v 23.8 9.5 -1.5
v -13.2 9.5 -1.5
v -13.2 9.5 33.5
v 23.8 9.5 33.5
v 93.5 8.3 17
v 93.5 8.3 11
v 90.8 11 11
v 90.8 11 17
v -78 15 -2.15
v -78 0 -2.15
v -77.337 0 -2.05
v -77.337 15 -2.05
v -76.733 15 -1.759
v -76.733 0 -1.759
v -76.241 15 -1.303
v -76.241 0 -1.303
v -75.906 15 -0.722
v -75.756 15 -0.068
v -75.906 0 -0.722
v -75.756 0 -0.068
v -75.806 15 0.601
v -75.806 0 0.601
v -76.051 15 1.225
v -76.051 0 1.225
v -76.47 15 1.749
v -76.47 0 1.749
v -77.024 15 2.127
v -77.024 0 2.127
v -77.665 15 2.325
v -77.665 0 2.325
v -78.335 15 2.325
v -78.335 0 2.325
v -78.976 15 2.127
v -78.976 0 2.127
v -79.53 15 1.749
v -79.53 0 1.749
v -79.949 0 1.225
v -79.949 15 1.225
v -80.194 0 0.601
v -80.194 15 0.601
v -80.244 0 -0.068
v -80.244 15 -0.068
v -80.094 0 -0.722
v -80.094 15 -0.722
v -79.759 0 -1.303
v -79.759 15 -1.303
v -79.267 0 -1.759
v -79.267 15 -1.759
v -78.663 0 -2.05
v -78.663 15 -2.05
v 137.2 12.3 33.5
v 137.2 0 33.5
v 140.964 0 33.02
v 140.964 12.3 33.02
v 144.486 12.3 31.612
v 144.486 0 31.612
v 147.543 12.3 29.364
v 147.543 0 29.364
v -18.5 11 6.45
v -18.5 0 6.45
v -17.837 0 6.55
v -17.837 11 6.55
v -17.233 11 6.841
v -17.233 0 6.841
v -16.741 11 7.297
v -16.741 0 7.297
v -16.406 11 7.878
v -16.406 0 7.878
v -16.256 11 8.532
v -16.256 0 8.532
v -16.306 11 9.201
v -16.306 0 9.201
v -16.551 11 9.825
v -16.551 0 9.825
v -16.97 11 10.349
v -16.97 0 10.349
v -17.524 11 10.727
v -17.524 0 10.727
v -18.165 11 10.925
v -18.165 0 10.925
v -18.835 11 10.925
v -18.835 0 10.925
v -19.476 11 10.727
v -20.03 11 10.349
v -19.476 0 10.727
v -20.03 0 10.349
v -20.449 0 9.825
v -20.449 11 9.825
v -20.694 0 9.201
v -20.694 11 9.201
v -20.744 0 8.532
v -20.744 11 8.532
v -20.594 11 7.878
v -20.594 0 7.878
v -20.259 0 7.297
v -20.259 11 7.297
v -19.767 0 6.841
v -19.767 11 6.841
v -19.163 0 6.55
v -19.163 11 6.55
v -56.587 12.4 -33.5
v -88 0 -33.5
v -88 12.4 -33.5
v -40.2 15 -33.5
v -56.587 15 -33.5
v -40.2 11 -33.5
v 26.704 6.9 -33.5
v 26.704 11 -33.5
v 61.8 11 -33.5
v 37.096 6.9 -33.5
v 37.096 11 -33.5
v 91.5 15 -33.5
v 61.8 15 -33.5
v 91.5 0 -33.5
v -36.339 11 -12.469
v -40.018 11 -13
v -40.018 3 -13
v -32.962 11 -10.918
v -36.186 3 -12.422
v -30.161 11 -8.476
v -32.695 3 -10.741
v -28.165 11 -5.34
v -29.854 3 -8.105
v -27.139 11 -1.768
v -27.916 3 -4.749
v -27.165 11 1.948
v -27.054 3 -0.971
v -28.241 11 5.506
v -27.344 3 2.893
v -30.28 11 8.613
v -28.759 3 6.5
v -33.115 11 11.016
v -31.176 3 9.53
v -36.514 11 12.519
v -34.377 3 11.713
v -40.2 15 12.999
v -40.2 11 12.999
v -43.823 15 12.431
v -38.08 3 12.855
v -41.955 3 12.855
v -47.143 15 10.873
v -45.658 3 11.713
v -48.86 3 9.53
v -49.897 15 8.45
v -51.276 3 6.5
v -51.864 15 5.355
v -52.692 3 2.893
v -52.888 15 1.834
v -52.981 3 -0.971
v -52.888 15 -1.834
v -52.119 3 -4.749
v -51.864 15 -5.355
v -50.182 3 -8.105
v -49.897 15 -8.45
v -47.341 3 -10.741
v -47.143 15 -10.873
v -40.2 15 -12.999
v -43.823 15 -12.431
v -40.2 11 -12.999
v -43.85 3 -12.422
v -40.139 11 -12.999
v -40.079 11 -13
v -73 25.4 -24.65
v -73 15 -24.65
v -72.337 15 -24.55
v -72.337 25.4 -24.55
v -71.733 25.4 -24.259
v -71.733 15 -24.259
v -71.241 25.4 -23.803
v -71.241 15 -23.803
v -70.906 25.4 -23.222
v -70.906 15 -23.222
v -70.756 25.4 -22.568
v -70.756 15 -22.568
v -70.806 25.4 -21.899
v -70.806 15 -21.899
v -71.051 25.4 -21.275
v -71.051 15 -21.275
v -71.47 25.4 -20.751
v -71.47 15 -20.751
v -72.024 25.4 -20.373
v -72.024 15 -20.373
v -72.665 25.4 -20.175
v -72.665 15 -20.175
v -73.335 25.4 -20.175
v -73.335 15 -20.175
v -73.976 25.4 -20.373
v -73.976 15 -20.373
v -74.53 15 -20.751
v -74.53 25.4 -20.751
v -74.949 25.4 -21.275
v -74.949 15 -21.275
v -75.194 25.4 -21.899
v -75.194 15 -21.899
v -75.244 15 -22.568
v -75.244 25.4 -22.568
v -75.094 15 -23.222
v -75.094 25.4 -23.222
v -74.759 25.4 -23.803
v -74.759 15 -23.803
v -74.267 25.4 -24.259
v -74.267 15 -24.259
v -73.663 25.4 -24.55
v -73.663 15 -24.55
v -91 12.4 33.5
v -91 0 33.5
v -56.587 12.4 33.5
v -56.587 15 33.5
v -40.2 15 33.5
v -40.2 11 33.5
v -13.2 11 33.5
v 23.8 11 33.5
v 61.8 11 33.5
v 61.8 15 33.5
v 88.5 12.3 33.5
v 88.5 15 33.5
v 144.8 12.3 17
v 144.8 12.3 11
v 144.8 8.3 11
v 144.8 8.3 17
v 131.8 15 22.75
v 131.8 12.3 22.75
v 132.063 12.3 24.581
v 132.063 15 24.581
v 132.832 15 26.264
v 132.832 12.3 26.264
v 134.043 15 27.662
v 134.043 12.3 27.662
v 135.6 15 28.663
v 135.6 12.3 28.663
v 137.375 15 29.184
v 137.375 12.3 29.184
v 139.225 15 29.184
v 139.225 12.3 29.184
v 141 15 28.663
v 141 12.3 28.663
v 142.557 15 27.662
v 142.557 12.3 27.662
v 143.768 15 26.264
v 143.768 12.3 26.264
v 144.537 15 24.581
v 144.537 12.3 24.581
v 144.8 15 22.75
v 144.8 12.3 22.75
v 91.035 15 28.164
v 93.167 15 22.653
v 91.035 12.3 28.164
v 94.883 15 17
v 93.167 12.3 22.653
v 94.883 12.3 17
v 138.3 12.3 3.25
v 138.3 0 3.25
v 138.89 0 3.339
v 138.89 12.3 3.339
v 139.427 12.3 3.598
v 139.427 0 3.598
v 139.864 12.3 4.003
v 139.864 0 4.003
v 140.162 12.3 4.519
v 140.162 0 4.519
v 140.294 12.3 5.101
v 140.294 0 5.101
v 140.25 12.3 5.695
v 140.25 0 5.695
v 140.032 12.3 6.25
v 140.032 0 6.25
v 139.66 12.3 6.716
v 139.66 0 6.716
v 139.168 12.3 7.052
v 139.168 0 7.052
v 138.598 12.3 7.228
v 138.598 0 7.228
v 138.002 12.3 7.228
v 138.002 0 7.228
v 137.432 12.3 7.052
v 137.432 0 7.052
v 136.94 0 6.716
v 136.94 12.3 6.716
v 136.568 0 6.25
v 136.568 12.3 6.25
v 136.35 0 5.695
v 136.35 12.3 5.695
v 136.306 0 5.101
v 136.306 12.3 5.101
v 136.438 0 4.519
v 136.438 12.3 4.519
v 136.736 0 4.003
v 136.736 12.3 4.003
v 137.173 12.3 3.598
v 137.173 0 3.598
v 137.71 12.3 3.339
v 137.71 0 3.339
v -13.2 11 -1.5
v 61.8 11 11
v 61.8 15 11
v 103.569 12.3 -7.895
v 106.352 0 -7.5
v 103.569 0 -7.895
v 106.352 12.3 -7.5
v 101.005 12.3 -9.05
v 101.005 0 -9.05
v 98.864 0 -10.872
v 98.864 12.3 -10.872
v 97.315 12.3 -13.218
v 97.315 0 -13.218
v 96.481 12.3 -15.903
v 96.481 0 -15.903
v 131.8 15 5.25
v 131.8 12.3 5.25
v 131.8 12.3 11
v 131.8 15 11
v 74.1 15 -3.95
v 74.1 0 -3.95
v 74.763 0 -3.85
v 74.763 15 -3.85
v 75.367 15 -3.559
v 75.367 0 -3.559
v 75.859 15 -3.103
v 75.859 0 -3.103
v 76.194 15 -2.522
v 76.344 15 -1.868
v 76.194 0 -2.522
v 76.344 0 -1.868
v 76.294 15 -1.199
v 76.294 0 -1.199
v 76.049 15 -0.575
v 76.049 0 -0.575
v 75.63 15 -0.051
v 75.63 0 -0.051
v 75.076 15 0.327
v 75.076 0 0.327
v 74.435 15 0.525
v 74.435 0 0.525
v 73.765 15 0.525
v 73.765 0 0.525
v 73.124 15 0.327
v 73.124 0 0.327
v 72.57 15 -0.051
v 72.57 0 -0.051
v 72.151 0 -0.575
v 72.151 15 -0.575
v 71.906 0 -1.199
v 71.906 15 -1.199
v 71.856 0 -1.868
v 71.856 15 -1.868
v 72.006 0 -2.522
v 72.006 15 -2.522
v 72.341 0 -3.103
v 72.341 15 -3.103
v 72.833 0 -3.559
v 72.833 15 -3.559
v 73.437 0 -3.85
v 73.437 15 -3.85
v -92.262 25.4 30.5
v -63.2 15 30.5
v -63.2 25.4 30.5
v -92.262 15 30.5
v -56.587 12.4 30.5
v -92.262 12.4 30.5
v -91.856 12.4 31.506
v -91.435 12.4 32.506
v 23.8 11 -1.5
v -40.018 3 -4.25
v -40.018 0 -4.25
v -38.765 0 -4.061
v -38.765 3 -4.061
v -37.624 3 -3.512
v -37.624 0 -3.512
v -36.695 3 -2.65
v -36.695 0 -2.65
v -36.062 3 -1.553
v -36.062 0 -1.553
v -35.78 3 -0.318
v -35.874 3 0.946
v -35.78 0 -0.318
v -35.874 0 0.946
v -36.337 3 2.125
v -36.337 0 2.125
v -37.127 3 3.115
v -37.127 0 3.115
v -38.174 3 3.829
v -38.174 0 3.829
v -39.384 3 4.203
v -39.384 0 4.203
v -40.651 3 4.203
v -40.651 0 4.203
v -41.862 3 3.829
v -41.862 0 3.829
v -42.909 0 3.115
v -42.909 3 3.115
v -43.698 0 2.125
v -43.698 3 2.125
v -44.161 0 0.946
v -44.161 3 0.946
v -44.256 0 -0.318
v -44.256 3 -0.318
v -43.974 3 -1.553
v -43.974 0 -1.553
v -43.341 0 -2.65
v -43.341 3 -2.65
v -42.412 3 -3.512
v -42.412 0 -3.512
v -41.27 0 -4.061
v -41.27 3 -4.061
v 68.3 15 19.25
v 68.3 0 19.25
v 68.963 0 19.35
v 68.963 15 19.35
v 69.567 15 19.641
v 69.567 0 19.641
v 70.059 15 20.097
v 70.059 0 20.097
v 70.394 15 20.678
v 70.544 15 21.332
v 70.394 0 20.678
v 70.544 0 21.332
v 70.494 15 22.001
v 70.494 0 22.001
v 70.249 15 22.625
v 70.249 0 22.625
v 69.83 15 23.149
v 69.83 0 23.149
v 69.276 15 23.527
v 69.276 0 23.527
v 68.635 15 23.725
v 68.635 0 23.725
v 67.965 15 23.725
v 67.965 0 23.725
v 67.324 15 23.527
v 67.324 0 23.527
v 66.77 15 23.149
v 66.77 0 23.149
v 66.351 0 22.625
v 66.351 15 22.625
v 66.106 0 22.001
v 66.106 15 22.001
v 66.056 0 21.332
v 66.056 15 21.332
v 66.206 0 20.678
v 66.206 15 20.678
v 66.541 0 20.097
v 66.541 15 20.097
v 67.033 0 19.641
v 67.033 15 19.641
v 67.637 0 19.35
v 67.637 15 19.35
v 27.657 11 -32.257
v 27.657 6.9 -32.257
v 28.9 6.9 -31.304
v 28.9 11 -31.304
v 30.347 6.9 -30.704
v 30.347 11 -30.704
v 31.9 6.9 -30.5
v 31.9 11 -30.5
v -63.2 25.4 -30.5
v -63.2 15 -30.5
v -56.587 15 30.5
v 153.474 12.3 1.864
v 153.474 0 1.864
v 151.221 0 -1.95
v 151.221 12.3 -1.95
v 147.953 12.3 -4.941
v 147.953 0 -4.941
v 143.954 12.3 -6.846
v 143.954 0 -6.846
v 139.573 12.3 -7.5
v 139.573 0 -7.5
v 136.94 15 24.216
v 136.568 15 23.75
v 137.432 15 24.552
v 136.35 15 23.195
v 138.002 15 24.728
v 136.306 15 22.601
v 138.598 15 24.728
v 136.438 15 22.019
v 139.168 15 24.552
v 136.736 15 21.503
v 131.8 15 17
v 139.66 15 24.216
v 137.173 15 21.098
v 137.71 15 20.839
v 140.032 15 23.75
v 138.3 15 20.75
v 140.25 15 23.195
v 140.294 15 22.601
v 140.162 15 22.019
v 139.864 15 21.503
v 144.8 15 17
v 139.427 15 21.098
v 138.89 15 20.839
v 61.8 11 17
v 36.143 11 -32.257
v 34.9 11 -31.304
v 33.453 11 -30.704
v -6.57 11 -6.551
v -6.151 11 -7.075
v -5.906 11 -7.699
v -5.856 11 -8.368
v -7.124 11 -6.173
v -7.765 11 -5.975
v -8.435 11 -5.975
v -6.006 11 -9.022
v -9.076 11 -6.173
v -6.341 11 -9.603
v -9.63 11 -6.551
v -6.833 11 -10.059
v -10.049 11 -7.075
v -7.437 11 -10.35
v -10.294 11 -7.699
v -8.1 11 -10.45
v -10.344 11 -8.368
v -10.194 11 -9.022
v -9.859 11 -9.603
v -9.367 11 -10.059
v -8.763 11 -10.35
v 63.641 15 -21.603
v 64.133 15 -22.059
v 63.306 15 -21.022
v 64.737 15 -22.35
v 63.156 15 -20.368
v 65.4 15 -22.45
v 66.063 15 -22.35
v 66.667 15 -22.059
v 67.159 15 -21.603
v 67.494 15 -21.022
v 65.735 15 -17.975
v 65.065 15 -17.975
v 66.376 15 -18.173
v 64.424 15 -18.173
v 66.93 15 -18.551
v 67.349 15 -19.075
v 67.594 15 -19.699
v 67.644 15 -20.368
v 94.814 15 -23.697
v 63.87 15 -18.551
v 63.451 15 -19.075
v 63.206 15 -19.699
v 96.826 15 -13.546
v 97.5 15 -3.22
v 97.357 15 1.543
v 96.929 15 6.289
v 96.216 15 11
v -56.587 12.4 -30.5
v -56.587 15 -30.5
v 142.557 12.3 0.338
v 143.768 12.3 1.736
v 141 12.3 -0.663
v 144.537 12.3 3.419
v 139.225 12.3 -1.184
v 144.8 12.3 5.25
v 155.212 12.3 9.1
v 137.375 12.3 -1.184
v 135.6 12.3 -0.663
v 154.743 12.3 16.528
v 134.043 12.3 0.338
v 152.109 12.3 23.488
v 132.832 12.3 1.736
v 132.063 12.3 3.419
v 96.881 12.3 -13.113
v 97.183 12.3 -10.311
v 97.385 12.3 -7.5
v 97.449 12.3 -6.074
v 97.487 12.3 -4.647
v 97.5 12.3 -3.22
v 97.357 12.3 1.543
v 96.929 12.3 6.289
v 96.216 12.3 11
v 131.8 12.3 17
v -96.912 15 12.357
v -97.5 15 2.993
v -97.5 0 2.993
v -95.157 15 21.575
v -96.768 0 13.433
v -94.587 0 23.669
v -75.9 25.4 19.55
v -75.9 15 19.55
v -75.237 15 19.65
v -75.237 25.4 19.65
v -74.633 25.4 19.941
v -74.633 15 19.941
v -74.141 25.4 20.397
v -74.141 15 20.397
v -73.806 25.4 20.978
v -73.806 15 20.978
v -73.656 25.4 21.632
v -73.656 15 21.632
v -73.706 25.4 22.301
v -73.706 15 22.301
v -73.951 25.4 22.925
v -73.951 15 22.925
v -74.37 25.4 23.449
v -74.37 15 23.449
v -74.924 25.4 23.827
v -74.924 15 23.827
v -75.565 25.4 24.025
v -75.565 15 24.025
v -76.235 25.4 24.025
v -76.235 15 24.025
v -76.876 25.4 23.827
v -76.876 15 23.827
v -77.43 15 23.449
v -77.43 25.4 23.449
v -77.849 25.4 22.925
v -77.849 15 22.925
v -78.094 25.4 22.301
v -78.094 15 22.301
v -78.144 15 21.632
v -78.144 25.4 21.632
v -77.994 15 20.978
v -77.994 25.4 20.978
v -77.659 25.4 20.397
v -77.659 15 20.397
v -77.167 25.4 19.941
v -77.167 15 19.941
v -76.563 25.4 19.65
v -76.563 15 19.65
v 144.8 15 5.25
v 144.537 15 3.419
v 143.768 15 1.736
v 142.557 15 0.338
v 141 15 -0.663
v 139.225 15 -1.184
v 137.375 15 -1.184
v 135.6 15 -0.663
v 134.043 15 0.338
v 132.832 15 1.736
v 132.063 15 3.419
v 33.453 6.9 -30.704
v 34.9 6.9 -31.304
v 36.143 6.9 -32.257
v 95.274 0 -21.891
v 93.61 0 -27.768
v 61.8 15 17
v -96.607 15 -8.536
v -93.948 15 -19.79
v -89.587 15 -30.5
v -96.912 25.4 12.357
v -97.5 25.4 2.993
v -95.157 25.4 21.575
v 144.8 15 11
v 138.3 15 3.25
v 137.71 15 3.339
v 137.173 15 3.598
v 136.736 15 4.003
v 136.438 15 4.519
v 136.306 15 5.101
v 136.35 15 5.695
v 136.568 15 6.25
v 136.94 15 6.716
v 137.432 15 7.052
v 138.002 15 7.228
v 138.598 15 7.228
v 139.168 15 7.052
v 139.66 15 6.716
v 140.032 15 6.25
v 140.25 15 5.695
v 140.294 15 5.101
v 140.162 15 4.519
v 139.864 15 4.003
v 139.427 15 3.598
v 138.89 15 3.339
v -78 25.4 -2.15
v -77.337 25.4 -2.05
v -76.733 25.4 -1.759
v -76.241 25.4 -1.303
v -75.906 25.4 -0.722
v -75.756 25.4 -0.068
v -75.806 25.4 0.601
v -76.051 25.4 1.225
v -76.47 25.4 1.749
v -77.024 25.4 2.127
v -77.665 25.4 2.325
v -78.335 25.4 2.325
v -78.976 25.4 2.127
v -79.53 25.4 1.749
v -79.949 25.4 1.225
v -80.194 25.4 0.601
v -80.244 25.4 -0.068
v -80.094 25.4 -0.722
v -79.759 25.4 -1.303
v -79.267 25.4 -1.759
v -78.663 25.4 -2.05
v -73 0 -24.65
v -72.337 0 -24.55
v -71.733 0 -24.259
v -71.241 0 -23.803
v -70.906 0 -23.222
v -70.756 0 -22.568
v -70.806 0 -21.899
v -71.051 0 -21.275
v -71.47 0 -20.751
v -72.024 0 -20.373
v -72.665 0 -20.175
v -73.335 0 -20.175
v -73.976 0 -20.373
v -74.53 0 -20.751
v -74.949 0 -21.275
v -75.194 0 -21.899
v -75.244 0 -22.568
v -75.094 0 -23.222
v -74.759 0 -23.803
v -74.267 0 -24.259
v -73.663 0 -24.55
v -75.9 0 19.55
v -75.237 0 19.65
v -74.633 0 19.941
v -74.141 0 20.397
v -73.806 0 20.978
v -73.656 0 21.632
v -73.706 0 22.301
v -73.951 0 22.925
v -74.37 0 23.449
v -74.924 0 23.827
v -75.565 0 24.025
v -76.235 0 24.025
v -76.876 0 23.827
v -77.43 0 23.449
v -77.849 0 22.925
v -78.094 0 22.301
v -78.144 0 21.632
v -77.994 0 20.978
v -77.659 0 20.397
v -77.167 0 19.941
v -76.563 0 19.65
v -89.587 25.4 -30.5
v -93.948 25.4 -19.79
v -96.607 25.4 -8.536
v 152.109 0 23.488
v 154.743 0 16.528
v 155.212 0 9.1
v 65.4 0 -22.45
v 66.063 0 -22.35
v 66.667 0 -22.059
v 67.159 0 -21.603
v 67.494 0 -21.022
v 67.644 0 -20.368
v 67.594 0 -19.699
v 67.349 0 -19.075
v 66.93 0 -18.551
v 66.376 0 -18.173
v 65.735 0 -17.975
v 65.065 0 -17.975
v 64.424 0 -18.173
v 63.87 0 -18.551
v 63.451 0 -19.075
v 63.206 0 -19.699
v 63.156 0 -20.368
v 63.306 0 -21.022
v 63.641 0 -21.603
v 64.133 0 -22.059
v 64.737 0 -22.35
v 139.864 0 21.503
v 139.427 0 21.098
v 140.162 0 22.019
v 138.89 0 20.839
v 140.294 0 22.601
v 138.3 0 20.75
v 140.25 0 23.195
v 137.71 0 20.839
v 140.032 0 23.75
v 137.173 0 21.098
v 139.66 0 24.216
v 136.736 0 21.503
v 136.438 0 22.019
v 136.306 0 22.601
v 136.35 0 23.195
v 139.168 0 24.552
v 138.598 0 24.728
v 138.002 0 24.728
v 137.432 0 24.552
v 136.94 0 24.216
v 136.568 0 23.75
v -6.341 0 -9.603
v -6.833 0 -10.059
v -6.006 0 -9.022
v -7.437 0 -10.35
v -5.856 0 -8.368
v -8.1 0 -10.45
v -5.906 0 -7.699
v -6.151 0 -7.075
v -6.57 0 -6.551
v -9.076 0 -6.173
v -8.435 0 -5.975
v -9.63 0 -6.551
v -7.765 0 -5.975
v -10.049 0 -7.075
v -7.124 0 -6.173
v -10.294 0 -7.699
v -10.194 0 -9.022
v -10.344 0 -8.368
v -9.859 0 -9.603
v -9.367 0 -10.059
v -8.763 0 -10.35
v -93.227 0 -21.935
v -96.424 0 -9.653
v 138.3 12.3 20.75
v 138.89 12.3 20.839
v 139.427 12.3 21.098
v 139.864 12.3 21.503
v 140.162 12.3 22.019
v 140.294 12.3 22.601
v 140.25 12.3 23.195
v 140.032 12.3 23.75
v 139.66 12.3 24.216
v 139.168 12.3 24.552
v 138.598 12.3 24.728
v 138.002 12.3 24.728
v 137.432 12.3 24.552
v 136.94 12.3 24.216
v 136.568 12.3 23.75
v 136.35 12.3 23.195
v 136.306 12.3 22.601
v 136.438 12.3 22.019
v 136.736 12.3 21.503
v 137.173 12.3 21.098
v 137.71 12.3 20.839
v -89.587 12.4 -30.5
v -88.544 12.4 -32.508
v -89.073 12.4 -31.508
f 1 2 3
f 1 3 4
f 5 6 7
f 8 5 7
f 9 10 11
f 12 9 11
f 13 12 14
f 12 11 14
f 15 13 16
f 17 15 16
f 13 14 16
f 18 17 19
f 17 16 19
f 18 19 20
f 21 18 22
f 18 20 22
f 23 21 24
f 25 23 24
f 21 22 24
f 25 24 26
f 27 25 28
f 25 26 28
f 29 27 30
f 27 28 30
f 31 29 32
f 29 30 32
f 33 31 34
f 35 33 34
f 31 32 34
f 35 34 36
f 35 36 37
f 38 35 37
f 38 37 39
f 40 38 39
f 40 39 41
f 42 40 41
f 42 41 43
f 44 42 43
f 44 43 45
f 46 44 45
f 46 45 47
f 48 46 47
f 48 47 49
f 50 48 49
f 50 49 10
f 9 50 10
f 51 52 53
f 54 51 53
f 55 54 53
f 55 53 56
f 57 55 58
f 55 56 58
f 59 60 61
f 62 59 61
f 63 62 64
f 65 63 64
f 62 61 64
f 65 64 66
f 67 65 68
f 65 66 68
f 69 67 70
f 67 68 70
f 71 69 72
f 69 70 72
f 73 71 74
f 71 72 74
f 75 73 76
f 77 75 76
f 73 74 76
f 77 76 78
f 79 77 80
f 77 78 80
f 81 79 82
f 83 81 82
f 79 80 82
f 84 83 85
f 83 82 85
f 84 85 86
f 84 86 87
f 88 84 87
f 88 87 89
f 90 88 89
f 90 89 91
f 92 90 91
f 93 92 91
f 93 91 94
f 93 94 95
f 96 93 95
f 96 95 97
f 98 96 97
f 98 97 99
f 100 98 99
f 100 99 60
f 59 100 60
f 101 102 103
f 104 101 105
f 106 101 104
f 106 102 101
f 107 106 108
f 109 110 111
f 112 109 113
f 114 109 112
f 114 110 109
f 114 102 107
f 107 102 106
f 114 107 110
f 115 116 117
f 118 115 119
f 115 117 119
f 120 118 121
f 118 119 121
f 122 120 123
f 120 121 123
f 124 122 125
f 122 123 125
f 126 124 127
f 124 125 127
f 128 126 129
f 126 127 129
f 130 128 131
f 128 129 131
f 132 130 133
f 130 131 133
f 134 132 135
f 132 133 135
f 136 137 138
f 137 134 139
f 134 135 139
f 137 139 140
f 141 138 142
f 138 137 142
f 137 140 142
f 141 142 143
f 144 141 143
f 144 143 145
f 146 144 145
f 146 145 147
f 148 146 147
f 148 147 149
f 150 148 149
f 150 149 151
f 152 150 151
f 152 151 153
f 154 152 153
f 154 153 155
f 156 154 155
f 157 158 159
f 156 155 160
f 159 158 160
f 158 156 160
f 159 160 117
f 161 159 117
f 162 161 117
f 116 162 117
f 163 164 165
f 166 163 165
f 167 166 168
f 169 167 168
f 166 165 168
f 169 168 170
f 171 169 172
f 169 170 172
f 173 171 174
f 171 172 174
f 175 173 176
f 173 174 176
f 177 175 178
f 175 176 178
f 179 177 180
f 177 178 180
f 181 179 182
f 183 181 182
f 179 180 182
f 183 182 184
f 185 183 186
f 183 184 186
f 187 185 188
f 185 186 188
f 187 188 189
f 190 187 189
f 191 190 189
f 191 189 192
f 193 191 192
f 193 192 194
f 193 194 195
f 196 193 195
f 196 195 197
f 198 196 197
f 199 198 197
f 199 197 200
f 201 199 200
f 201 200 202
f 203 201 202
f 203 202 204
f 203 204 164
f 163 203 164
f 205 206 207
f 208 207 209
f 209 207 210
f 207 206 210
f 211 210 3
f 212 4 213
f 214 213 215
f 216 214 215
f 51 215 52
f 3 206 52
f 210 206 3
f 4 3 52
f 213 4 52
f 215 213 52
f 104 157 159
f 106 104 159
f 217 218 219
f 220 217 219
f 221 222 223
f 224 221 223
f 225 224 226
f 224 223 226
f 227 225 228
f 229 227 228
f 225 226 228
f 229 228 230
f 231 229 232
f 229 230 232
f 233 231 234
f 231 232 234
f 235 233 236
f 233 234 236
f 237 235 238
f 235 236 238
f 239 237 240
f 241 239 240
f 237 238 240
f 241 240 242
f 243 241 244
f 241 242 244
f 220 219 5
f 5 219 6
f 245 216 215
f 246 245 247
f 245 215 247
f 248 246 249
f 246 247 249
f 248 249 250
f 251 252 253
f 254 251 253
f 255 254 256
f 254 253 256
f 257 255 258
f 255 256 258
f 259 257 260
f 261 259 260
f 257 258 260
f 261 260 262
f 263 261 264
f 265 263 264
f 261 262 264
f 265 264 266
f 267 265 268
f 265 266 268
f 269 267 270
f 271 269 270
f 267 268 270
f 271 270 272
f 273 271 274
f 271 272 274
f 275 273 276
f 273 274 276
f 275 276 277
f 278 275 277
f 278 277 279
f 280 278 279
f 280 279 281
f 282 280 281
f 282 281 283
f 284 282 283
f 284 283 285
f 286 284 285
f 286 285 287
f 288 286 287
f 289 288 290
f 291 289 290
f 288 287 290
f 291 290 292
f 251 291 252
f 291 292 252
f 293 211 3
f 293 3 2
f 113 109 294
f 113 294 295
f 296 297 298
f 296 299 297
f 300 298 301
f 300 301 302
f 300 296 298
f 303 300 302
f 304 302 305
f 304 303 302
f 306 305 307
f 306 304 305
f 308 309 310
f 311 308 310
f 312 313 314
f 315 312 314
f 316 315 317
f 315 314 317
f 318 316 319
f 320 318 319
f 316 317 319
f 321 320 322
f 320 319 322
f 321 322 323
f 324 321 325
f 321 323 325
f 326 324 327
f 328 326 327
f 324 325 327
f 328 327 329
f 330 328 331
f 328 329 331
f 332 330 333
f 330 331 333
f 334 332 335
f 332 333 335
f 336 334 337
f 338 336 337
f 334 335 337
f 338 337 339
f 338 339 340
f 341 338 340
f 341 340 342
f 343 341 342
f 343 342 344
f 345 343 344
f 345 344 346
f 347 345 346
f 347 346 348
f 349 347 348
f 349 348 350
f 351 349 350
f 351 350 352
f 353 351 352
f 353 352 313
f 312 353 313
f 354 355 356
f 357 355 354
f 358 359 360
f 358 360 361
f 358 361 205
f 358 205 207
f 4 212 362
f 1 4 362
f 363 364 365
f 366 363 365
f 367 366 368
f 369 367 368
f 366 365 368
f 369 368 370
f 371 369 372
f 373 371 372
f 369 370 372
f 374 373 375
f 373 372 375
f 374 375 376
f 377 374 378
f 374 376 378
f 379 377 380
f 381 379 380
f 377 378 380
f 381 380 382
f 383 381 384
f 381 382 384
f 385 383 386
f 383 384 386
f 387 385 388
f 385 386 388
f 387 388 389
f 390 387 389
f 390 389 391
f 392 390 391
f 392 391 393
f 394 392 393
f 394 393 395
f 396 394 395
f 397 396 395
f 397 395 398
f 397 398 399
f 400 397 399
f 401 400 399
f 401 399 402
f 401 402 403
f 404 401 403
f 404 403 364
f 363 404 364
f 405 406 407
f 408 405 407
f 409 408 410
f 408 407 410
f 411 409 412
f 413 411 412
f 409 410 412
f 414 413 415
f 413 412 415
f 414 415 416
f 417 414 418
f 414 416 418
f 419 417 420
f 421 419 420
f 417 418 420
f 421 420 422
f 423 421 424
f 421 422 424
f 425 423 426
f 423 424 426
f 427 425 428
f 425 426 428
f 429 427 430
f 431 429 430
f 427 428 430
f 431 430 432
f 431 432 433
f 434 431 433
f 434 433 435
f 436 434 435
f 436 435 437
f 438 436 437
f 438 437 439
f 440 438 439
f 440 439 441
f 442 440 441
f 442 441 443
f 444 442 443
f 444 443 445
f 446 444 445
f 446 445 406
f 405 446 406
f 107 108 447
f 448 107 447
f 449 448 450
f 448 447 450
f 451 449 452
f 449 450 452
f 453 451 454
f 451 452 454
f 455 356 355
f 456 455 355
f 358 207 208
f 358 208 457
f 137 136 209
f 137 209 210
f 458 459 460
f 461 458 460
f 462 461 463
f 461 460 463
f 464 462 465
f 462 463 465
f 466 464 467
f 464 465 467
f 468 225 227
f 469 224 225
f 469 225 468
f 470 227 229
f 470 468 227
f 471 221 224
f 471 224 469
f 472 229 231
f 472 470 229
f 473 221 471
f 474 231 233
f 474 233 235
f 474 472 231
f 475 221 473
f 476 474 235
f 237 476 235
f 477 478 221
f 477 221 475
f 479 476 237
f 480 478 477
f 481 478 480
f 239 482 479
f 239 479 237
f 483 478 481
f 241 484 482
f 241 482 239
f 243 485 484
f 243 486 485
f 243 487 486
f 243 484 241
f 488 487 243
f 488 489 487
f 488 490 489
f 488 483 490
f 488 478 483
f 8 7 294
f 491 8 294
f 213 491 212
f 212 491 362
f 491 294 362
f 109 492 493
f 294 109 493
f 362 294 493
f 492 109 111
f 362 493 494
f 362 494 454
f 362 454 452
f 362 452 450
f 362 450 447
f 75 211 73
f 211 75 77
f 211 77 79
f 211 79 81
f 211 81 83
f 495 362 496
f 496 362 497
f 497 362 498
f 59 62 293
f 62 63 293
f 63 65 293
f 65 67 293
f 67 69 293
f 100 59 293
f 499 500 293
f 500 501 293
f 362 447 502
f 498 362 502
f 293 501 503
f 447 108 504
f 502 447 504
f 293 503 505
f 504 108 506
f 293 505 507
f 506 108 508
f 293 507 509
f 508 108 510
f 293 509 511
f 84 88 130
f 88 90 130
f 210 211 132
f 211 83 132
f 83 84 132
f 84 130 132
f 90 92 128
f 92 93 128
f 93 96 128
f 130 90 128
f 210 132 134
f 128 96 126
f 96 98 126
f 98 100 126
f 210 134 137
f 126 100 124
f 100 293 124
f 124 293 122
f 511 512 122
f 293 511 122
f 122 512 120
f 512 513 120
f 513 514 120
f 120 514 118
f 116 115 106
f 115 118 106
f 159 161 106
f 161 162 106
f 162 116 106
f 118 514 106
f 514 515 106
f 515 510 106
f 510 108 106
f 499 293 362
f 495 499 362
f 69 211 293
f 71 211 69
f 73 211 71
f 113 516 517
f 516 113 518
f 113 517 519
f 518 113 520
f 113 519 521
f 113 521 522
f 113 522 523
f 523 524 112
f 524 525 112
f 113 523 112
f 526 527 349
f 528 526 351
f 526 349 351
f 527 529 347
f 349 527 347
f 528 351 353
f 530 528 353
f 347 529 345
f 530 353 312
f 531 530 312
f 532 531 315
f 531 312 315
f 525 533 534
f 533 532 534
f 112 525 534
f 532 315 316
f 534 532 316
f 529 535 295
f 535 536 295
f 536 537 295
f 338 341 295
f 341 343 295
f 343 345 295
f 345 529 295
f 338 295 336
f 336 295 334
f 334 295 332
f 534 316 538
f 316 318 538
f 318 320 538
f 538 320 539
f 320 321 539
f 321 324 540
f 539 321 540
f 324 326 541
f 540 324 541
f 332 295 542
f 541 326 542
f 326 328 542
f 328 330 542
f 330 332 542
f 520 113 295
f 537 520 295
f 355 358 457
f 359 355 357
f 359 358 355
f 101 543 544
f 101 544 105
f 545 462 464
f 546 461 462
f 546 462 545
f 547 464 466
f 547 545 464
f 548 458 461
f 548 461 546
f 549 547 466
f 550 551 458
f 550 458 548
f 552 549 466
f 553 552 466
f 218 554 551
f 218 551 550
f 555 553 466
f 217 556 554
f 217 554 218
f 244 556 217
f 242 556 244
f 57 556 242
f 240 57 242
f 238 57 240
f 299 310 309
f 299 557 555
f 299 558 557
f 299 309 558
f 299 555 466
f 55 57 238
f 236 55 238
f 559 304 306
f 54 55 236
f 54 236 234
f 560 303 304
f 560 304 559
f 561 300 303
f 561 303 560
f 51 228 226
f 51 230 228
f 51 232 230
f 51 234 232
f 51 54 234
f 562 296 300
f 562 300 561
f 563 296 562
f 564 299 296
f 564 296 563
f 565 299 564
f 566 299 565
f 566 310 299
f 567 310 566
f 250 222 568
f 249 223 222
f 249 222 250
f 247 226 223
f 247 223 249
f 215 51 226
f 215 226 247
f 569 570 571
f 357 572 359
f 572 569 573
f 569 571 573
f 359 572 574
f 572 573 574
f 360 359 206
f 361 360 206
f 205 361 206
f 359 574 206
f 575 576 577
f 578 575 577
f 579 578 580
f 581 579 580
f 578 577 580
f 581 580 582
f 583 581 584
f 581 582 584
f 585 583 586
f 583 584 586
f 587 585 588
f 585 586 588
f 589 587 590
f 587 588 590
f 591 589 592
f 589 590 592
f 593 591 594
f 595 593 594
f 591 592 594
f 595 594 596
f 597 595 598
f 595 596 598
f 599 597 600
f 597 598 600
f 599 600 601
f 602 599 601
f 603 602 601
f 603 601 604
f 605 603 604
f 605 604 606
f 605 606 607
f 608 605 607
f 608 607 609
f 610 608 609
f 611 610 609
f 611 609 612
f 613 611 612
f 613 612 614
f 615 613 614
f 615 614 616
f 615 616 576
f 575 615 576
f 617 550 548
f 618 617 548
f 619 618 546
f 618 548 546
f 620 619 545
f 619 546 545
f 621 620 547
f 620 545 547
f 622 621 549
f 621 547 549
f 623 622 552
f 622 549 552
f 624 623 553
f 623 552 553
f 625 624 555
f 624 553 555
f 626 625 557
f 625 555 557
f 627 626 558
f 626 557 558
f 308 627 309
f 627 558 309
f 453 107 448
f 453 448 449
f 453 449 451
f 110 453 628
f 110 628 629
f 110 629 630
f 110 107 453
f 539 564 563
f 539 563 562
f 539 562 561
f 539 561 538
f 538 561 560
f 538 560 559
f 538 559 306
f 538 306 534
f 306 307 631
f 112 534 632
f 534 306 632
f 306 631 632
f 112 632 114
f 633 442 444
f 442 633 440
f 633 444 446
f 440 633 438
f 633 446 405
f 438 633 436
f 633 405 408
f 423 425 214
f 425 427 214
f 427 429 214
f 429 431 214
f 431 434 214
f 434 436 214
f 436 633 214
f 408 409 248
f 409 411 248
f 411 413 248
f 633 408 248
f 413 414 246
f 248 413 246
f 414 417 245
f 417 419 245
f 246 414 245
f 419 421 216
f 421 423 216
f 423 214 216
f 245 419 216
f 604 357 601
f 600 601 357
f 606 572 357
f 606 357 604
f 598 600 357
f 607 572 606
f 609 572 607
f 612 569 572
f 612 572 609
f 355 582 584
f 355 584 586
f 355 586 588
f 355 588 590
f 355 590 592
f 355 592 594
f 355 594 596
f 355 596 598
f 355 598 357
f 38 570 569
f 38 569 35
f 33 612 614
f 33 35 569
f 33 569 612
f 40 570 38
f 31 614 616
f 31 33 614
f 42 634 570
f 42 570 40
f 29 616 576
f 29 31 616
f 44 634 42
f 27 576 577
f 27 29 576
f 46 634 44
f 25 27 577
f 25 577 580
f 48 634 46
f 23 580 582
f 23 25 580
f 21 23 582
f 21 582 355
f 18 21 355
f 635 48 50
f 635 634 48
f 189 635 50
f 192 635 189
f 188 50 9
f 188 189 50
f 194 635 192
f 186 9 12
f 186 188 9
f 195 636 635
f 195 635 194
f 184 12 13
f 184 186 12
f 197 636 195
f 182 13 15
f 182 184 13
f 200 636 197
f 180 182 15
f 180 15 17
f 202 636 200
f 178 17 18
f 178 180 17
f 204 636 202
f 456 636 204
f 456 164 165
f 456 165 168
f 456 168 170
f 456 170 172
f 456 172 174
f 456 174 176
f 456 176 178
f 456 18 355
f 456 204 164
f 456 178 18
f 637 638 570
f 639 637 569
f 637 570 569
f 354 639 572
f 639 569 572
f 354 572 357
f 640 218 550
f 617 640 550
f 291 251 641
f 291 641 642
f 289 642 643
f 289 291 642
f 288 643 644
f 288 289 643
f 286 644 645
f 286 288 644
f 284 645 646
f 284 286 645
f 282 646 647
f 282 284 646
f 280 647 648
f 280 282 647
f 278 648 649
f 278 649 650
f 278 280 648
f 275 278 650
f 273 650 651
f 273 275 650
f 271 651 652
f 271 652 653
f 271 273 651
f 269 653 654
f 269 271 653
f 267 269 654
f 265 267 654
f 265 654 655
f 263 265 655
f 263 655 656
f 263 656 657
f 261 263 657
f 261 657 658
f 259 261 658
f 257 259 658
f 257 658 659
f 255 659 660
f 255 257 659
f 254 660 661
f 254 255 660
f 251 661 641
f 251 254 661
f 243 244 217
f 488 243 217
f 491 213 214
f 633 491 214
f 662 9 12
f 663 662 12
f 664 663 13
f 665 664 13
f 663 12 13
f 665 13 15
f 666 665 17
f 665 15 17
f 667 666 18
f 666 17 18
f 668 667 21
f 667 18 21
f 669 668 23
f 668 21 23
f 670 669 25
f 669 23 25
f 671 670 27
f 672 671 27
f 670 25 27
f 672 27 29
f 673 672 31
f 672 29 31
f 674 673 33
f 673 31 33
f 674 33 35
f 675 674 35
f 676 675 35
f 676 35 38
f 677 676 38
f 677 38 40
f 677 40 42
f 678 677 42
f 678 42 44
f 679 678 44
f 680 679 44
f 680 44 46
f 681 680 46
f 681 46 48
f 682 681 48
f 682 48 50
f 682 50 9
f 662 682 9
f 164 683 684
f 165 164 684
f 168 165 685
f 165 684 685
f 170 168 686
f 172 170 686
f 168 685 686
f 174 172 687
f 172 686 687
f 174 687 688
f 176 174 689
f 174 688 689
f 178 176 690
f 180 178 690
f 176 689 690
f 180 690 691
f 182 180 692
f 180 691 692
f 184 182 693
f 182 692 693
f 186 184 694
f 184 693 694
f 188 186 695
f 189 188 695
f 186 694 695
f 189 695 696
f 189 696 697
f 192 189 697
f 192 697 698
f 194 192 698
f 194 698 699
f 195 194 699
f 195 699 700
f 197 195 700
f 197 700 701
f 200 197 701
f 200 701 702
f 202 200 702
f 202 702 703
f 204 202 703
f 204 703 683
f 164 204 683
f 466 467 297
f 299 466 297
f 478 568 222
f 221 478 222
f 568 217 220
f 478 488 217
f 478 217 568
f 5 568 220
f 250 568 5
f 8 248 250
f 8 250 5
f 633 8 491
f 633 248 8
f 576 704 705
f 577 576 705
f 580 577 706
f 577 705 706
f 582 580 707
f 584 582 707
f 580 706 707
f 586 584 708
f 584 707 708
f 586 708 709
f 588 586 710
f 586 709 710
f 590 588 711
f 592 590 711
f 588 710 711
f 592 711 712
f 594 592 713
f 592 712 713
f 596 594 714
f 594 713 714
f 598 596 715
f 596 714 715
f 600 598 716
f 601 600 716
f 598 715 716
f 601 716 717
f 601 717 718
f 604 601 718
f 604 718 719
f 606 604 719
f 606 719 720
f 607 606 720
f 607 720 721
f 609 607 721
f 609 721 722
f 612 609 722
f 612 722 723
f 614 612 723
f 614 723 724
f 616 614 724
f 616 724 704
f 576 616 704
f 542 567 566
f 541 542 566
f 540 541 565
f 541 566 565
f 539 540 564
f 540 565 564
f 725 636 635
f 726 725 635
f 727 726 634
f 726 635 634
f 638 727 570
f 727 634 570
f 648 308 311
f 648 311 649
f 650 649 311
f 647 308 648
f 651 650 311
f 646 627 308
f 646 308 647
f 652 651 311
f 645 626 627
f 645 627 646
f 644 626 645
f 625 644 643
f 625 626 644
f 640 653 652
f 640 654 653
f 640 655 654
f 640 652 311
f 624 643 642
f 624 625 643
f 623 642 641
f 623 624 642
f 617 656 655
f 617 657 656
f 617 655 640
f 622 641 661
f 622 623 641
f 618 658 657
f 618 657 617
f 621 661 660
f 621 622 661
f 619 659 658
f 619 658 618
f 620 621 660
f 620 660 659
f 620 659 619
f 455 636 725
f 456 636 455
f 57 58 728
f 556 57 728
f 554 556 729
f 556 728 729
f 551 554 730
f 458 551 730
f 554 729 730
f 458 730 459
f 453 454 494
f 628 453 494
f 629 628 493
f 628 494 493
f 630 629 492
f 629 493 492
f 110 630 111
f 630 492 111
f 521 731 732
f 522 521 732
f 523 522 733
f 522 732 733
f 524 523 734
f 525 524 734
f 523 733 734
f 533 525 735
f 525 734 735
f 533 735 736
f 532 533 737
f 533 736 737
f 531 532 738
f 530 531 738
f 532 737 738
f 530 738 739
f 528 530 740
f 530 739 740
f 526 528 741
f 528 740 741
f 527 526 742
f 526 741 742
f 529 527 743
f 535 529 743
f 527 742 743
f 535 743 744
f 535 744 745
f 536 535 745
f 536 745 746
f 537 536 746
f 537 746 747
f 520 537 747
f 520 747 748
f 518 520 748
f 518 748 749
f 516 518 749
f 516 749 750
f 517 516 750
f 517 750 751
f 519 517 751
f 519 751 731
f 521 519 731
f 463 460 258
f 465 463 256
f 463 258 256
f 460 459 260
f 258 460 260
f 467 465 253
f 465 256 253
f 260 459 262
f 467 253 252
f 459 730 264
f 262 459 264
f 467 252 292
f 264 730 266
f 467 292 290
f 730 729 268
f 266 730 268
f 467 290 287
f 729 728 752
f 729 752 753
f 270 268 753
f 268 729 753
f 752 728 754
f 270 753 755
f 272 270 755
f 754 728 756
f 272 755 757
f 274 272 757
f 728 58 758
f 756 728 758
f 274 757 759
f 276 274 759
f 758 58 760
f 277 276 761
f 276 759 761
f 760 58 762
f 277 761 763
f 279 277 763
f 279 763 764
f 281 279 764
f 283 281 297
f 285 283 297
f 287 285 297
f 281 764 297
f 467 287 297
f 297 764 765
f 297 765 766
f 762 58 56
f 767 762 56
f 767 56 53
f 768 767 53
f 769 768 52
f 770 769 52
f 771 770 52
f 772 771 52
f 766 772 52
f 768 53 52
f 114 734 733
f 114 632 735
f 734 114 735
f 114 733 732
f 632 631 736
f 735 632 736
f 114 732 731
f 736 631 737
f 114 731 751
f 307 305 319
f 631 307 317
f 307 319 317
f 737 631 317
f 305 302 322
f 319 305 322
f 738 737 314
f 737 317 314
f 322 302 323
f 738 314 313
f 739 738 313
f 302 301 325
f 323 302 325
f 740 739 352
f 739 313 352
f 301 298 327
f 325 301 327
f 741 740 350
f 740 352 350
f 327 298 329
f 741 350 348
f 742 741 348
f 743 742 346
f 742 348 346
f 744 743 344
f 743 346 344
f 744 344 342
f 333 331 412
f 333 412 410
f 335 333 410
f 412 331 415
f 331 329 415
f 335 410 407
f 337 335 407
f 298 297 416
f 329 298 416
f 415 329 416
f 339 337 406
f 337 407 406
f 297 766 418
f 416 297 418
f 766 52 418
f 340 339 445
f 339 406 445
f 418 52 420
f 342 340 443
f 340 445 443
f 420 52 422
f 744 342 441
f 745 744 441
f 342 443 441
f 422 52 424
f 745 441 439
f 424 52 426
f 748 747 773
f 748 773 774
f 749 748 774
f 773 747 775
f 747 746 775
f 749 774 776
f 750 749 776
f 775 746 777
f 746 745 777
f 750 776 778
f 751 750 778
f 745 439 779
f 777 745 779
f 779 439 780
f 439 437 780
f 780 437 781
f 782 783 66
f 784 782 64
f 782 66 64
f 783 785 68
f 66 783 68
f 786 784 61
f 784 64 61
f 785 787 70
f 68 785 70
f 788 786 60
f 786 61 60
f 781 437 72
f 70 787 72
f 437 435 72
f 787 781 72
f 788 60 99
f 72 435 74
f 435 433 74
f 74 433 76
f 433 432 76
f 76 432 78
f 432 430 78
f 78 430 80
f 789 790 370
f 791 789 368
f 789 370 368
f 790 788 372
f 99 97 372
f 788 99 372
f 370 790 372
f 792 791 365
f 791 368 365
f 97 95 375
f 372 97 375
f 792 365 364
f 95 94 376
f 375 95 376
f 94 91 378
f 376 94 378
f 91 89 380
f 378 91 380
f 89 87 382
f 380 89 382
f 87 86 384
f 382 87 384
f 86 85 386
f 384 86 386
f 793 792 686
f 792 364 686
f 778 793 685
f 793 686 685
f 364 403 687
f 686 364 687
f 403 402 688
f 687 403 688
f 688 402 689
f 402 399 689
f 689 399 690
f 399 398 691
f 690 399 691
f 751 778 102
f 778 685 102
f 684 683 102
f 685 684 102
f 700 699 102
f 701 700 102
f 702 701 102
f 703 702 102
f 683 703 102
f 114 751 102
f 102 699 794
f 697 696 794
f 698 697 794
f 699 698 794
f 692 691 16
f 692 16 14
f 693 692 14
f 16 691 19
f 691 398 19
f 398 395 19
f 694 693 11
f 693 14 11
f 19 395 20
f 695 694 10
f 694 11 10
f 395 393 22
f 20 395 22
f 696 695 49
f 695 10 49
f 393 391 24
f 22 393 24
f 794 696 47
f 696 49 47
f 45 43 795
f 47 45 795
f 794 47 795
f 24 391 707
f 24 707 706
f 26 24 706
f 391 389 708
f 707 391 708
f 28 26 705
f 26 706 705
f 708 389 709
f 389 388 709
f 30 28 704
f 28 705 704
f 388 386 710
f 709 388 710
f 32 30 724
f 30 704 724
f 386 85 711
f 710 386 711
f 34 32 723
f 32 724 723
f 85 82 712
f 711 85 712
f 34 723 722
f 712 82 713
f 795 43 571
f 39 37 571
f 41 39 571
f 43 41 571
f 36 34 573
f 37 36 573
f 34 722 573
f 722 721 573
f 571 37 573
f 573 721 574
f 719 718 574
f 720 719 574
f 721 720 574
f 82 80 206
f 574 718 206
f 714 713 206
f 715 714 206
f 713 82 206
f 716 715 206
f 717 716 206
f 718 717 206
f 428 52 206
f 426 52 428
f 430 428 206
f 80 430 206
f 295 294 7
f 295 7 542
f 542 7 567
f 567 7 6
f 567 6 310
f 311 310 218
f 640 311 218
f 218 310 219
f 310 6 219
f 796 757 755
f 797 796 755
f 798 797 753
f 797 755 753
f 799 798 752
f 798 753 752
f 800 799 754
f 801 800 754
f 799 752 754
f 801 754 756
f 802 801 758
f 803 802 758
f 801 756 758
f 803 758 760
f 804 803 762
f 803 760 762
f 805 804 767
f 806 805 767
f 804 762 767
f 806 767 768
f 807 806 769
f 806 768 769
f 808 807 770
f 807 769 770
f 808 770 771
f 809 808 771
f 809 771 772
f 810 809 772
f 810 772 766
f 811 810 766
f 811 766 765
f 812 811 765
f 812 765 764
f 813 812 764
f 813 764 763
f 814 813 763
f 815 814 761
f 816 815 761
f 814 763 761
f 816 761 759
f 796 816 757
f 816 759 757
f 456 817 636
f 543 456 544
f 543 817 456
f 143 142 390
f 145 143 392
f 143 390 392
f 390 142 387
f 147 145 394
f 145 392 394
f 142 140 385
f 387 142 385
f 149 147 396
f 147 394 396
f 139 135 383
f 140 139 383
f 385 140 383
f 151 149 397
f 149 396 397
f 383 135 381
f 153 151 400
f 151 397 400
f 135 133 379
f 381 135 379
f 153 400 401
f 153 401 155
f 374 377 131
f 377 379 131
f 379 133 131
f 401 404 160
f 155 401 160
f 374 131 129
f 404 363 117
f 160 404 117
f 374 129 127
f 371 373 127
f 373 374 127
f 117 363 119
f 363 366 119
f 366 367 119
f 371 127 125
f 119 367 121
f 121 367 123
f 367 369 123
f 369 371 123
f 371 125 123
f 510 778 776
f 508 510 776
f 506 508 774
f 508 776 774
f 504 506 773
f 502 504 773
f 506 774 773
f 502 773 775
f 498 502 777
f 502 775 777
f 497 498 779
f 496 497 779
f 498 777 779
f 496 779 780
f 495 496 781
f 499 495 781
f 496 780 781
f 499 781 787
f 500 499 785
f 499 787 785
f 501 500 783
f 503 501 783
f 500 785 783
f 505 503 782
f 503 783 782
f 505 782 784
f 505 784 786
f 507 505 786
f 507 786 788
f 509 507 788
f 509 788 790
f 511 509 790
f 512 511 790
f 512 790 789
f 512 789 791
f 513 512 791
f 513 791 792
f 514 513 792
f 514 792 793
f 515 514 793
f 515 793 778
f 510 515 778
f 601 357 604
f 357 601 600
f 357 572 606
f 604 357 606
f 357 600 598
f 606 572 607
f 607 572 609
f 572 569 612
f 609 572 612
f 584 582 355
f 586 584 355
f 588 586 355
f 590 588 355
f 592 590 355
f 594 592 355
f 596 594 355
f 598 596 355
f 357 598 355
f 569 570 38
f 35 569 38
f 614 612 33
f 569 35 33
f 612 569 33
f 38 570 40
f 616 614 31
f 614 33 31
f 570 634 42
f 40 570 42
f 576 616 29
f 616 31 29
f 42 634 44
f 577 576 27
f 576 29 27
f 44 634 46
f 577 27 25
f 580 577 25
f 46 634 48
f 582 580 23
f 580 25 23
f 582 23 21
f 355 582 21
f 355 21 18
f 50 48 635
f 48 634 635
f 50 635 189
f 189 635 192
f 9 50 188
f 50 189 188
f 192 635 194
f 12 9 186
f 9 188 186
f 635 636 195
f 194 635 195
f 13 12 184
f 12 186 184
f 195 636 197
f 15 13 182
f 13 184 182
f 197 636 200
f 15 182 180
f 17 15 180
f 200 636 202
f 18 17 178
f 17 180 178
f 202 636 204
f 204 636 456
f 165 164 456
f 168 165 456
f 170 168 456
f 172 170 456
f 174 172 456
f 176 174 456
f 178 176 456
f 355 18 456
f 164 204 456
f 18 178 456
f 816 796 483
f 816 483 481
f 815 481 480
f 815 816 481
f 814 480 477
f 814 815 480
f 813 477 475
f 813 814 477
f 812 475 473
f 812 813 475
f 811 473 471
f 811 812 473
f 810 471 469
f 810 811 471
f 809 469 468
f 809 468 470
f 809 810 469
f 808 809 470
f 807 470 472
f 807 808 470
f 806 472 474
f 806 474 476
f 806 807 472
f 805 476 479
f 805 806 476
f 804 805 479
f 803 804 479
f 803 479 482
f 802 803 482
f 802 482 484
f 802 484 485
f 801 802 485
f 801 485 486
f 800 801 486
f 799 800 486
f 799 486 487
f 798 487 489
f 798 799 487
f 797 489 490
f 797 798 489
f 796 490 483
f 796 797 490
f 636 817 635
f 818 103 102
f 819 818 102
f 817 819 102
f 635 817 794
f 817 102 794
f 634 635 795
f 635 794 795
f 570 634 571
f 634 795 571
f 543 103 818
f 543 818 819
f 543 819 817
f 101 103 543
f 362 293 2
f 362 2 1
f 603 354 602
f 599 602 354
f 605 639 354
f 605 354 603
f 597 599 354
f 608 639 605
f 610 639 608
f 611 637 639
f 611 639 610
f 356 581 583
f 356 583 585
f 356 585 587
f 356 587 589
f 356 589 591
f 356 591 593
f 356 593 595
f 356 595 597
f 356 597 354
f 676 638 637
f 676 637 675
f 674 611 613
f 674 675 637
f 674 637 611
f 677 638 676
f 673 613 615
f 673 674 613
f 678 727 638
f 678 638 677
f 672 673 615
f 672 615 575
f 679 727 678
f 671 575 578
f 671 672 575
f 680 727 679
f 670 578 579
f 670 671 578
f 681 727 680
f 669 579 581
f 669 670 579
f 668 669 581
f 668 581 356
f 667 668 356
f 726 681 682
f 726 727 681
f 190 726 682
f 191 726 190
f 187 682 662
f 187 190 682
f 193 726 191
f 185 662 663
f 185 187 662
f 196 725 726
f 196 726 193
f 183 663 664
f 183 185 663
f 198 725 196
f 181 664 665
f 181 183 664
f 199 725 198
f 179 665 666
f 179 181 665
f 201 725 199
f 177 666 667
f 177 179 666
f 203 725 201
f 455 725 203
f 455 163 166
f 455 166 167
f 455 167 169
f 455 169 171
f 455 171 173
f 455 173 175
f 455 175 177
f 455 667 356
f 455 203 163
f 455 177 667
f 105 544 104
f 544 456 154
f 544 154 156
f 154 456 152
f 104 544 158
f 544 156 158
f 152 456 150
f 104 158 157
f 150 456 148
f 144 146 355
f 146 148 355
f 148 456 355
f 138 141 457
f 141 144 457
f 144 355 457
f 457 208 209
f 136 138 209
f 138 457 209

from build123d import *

# Parameters (mm, degrees)
SKETCH1_W           = 195
SKETCH1_H           = 67
BOSS_EXTRUDE1_DEPTH = 25.4
CUT_EXTRUDE1_DEPTH  = 107.177492907
CUT_EXTRUDE2_DEPTH  = 121.997561959
CUT_EXTRUDE3_START  = -13
SKETCH4_W           = 6.612655346
SKETCH4_H           = 3
CUT_EXTRUDE3_DEPTH  = 13
SKETCH6_R           = 2.25
CUT_EXTRUDE4_DEPTH  = 107.177492907
SKETCH7_W           = 37
SKETCH7_H           = 35
CUT_EXTRUDE5_DEPTH  = 1.5
CUT_EXTRUDE6_DEPTH  = 18.5
SKETCH9_R           = 2
BOSS_EXTRUDE2_DEPTH = 12.3
FILLET1_R           = 10
CUT_EXTRUDE7_REACH  = 165.895
CUT_EXTRUDE7_START  = -3
SKETCH10_R          = 13
SKETCH13_R          = 4.25
CUT_EXTRUDE9_DEPTH  = 161.89488962
SKETCH11_R          = 2
BOSS_EXTRUDE3_DEPTH = 2.7
CUT_EXTRUDE8_DEPTH  = 6


# Read off the part's stored shape, not the designer's step: Split1
with BuildPart() as part:
    # Sketch1 → Boss-Extrude1 (new body)
    with BuildSketch(Plane(origin=(0, 0, 0), x_dir=(1, 0, 0), z_dir=(0, 1, 0))):
        Rectangle(SKETCH1_W, SKETCH1_H)
    extrude(amount=BOSS_EXTRUDE1_DEPTH)

    # Sketch2 → Cut-Extrude1 (cut, through all)
    with BuildSketch(Plane.XZ):
        with BuildLine():
            Line((97.5, -3.219751644), (97.5, 33.5))
            Line((97.5, 33.5), (88.5, 33.5))
            ThreePointArc((88.5, 33.5), (95.217186872, 15.683556008), (97.5, -3.219751644))
        make_face()
        with BuildLine():
            Line((97.5, -33.5), (97.5, -3.219751644))
            ThreePointArc((97.5, -3.219751644), (95.985558513, -18.65423771), (91.5, -33.5))
            Line((91.5, -33.5), (97.5, -33.5))
        make_face()
        with BuildLine():
            ThreePointArc((-88, -33.5), (-95.08607052, -15.861694529), (-97.5, 2.992884749))
            Line((-97.5, 2.992884749), (-97.5, -33.5))
            Line((-97.5, -33.5), (-88, -33.5))
        make_face()
        with BuildLine():
            ThreePointArc((-97.5, 2.992884749), (-95.856964648, 18.588830376), (-91, 33.5))
            Line((-91, 33.5), (-97.5, 33.5))
            Line((-97.5, 33.5), (-97.5, 2.992884749))
        make_face()
    extrude(amount=-CUT_EXTRUDE1_DEPTH, mode=Mode.SUBTRACT)

    # Sketch3 → Cut-Extrude2 (cut, through all)
    with BuildSketch(Plane(origin=(0, 0, 33.5), x_dir=(-1, 0, 0), z_dir=(0, 0, -1))):
        Polygon((63.2, 25.4), (63.2, 15), (40.2, 15), (40.2, 11), (-61.8, 11), (-61.8, 15), (-97.5, 15), (-97.5, 25.4), align=None)
    extrude(amount=CUT_EXTRUDE2_DEPTH, mode=Mode.SUBTRACT)

    # Sketch4 → Cut-Extrude3 (cut)
    with BuildSketch(Plane(origin=(0, 25.4, 0), x_dir=(1, 0, 0), z_dir=(0, 1, 0)).offset(CUT_EXTRUDE3_START)):
        with BuildLine():
            Line((-63.2, 30.5), (-63.2, 33.5))
            Line((-63.2, 33.5), (-88, 33.5))
            ThreePointArc((-88, 33.5), (-88.810680862, 32.008999469), (-89.587344654, 30.5))
            Line((-89.587344654, 30.5), (-63.2, 30.5))
        make_face()
        with Locations((-59.893672327, 32)):
            Rectangle(SKETCH4_W, SKETCH4_H)
        with BuildLine():
            Line((-63.2, -33.5), (-63.2, -30.5))
            Line((-63.2, -30.5), (-92.261692194, -30.5))
            ThreePointArc((-92.261692194, -30.5), (-91.647155152, -32.006859002), (-91, -33.5))
            Line((-91, -33.5), (-63.2, -33.5))
        make_face()
        with Locations((-59.893672327, -32)):
            Rectangle(SKETCH4_W, SKETCH4_H)
    extrude(amount=CUT_EXTRUDE3_DEPTH, mode=Mode.SUBTRACT)

    # Sketch6 → Cut-Extrude4 (cut, through all)
    with BuildSketch(Plane.XZ):
        with Locations(Location((-18.5, 8.7, 0), (0, 0, 270))):
            Circle(SKETCH6_R)
        with Locations(Location((74.1, -1.7, 0), (0, 0, 270))):
            Circle(SKETCH6_R)
        with Locations(Location((68.3, 21.5, 0), (0, 0, 270))):
            Circle(SKETCH6_R)
        with Locations(Location((65.4, -20.2, 0), (0, 0, 270))):
            Circle(SKETCH6_R)
        with Locations(Location((-8.1, -8.2, 0), (0, 0, 270))):
            Circle(SKETCH6_R)
        with Locations(Location((-75.9, 21.8, 0), (0, 0, 270))):
            Circle(SKETCH6_R)
        with Locations(Location((-78, 0.1, 0), (0, 0, 270))):
            Circle(SKETCH6_R)
        with Locations(Location((-73, -22.4, 0), (0, 0, 270))):
            Circle(SKETCH6_R)
    extrude(amount=-CUT_EXTRUDE4_DEPTH, mode=Mode.SUBTRACT)

    # Sketch7 → Cut-Extrude5 (cut)
    with BuildSketch(Plane(origin=(0, 11, 0), x_dir=(1, 0, 0), z_dir=(0, 1, 0))):
        with Locations((5.3, -16)):
            Rectangle(SKETCH7_W, SKETCH7_H)
    extrude(amount=-CUT_EXTRUDE5_DEPTH, mode=Mode.SUBTRACT)

    # Sketch8 → Cut-Extrude6 (cut)
    with BuildSketch(Plane(origin=(0, 25.4, 0), x_dir=(1, 0, 0), z_dir=(0, 1, 0))):
        with BuildLine():
            Line((37.096152423, 33.5), (31.9, 33.5))
            Line((31.9, 33.5), (31.9, 30.5))
            ThreePointArc((31.9, 30.5), (34.9, 31.303847577), (37.096152423, 33.5))
        make_face()
        with BuildLine():
            Line((31.9, 33.5), (26.703847577, 33.5))
            ThreePointArc((26.703847577, 33.5), (28.9, 31.303847577), (31.9, 30.5))
            Line((31.9, 30.5), (31.9, 33.5))
        make_face()
    extrude(amount=-CUT_EXTRUDE6_DEPTH, mode=Mode.SUBTRACT)

    # Sketch9 → Boss-Extrude2 (add)
    with BuildSketch(Plane.XZ):
        with BuildLine():
            Line((88.5, 33.5), (137.200361796, 33.5))
            ThreePointArc((137.200361796, 33.5), (142.769729546, 32.427747228), (147.542861296, 29.364285714))
            ThreePointArc((147.542861296, 29.364285714), (154.743476693, 16.527679502), (153.473750823, 1.864285714))
            ThreePointArc((153.473750823, 1.864285714), (147.953179578, -4.940573023), (139.572717606, -7.5))
            Line((139.572717606, -7.5), (97.384558849, -7.5))
            ThreePointArc((97.384558849, -7.5), (95.698800641, 13.597328658), (88.5, 33.5))
        make_face()
        with Locations(Location((138.3, 5.25, 0), (0, 0, 270))):
            Circle(SKETCH9_R, mode=Mode.SUBTRACT)
        with Locations(Location((138.3, 22.75, 0), (0, 0, 270))):
            Circle(SKETCH9_R, mode=Mode.SUBTRACT)
    extrude(amount=-BOSS_EXTRUDE2_DEPTH)

    # Fillet1
    fillet1_edges = [part.edges().sort_by_distance(p)[0] for p in [
        (97.384558849, 6.15, -7.5),
    ]]
    fillet(fillet1_edges, radius=FILLET1_R)

    # Cut-Extrude7: up to this face of the body (flat: up to its plane)
    cut_extrude7_end = Plane(part.part.faces().sort_by_distance((-51.483463415, 15, 0))[0])
    # Sketch10 → Cut-Extrude7 (cut, up to the picked face)
    with BuildSketch(Plane.XZ.offset(CUT_EXTRUDE7_START), mode=Mode.PRIVATE) as cut_extrude7_sk1:
        with Locations(Location((-40.017782272, 0, 0), (0, 0, 270))):
            Circle(SKETCH10_R)
    cut_extrude7_tool1 = split(extrude(cut_extrude7_sk1.sketch, amount=-CUT_EXTRUDE7_REACH, mode=Mode.PRIVATE), bisect_by=cut_extrude7_end, keep=Keep.BOTH, mode=Mode.PRIVATE)
    add(cut_extrude7_tool1.solids().sort_by(Axis((-40.017782, 3, 0), (0, 1, 0)))[0], mode=Mode.SUBTRACT)

    # Sketch13 → Cut-Extrude9 (cut, through all)
    with BuildSketch(Plane.XZ):
        with Locations(Location((-40.017782272, 0, 0), (0, 0, 270))):
            Circle(SKETCH13_R)
    extrude(amount=-CUT_EXTRUDE9_DEPTH, mode=Mode.SUBTRACT)

    # Sketch11 → Boss-Extrude3 (add)
    # profile 1 of 2: a face of its own
    with BuildSketch(Plane(origin=(0, 12.3, 0), x_dir=(1, 0, 0), z_dir=(0, 1, 0))):
        with BuildLine():
            Line((144.8, -11), (144.8, -5.25))
            ThreePointArc((144.8, -5.25), (138.3, 1.25), (131.8, -5.25))
            Line((131.8, -5.25), (131.8, -11))
            Line((131.8, -11), (144.8, -11))
        make_face()
        with Locations(Location((138.3, -5.25, 0), (0, 0, 90))):
            Circle(SKETCH11_R, mode=Mode.SUBTRACT)
    # profile 2 of 2: a face of its own
    with BuildSketch(Plane(origin=(0, 12.3, 0), x_dir=(1, 0, 0), z_dir=(0, 1, 0))):
        with BuildLine():
            Line((144.8, -22.75), (144.8, -17))
            Line((144.8, -17), (131.8, -17))
            Line((131.8, -17), (131.8, -22.75))
            ThreePointArc((131.8, -22.75), (138.3, -29.25), (144.8, -22.75))
        make_face()
        with Locations(Location((138.3, -22.75, 0), (0, 0, 90))):
            Circle(SKETCH11_R, mode=Mode.SUBTRACT)
    extrude(amount=BOSS_EXTRUDE3_DEPTH)

    # Sketch12 → Cut-Extrude8 (cut)
    with BuildSketch(Plane.XY.offset(11)):
        Polygon((144.8, 15), (144.8, 8.3), (93.5, 8.3), (90.8, 11), (61.8, 11), (61.8, 15), align=None)
    extrude(amount=CUT_EXTRUDE8_DEPTH, mode=Mode.SUBTRACT)


with BuildPart() as body_2:
    # Split1: the piece on the far side of the plane
    add(part.part)
    split(bisect_by=Plane(origin=(0, 15, 0), x_dir=(1, 0, 0), z_dir=(0, 1, 0)), keep=Keep.BOTTOM)


with BuildPart() as part_1:
    add(part.part)

    # Split1
    split(bisect_by=Plane(origin=(0, 15, 0), x_dir=(1, 0, 0), z_dir=(0, 1, 0)), keep=Keep.TOP)


solid = Compound([body_2.part, part_1.part])
